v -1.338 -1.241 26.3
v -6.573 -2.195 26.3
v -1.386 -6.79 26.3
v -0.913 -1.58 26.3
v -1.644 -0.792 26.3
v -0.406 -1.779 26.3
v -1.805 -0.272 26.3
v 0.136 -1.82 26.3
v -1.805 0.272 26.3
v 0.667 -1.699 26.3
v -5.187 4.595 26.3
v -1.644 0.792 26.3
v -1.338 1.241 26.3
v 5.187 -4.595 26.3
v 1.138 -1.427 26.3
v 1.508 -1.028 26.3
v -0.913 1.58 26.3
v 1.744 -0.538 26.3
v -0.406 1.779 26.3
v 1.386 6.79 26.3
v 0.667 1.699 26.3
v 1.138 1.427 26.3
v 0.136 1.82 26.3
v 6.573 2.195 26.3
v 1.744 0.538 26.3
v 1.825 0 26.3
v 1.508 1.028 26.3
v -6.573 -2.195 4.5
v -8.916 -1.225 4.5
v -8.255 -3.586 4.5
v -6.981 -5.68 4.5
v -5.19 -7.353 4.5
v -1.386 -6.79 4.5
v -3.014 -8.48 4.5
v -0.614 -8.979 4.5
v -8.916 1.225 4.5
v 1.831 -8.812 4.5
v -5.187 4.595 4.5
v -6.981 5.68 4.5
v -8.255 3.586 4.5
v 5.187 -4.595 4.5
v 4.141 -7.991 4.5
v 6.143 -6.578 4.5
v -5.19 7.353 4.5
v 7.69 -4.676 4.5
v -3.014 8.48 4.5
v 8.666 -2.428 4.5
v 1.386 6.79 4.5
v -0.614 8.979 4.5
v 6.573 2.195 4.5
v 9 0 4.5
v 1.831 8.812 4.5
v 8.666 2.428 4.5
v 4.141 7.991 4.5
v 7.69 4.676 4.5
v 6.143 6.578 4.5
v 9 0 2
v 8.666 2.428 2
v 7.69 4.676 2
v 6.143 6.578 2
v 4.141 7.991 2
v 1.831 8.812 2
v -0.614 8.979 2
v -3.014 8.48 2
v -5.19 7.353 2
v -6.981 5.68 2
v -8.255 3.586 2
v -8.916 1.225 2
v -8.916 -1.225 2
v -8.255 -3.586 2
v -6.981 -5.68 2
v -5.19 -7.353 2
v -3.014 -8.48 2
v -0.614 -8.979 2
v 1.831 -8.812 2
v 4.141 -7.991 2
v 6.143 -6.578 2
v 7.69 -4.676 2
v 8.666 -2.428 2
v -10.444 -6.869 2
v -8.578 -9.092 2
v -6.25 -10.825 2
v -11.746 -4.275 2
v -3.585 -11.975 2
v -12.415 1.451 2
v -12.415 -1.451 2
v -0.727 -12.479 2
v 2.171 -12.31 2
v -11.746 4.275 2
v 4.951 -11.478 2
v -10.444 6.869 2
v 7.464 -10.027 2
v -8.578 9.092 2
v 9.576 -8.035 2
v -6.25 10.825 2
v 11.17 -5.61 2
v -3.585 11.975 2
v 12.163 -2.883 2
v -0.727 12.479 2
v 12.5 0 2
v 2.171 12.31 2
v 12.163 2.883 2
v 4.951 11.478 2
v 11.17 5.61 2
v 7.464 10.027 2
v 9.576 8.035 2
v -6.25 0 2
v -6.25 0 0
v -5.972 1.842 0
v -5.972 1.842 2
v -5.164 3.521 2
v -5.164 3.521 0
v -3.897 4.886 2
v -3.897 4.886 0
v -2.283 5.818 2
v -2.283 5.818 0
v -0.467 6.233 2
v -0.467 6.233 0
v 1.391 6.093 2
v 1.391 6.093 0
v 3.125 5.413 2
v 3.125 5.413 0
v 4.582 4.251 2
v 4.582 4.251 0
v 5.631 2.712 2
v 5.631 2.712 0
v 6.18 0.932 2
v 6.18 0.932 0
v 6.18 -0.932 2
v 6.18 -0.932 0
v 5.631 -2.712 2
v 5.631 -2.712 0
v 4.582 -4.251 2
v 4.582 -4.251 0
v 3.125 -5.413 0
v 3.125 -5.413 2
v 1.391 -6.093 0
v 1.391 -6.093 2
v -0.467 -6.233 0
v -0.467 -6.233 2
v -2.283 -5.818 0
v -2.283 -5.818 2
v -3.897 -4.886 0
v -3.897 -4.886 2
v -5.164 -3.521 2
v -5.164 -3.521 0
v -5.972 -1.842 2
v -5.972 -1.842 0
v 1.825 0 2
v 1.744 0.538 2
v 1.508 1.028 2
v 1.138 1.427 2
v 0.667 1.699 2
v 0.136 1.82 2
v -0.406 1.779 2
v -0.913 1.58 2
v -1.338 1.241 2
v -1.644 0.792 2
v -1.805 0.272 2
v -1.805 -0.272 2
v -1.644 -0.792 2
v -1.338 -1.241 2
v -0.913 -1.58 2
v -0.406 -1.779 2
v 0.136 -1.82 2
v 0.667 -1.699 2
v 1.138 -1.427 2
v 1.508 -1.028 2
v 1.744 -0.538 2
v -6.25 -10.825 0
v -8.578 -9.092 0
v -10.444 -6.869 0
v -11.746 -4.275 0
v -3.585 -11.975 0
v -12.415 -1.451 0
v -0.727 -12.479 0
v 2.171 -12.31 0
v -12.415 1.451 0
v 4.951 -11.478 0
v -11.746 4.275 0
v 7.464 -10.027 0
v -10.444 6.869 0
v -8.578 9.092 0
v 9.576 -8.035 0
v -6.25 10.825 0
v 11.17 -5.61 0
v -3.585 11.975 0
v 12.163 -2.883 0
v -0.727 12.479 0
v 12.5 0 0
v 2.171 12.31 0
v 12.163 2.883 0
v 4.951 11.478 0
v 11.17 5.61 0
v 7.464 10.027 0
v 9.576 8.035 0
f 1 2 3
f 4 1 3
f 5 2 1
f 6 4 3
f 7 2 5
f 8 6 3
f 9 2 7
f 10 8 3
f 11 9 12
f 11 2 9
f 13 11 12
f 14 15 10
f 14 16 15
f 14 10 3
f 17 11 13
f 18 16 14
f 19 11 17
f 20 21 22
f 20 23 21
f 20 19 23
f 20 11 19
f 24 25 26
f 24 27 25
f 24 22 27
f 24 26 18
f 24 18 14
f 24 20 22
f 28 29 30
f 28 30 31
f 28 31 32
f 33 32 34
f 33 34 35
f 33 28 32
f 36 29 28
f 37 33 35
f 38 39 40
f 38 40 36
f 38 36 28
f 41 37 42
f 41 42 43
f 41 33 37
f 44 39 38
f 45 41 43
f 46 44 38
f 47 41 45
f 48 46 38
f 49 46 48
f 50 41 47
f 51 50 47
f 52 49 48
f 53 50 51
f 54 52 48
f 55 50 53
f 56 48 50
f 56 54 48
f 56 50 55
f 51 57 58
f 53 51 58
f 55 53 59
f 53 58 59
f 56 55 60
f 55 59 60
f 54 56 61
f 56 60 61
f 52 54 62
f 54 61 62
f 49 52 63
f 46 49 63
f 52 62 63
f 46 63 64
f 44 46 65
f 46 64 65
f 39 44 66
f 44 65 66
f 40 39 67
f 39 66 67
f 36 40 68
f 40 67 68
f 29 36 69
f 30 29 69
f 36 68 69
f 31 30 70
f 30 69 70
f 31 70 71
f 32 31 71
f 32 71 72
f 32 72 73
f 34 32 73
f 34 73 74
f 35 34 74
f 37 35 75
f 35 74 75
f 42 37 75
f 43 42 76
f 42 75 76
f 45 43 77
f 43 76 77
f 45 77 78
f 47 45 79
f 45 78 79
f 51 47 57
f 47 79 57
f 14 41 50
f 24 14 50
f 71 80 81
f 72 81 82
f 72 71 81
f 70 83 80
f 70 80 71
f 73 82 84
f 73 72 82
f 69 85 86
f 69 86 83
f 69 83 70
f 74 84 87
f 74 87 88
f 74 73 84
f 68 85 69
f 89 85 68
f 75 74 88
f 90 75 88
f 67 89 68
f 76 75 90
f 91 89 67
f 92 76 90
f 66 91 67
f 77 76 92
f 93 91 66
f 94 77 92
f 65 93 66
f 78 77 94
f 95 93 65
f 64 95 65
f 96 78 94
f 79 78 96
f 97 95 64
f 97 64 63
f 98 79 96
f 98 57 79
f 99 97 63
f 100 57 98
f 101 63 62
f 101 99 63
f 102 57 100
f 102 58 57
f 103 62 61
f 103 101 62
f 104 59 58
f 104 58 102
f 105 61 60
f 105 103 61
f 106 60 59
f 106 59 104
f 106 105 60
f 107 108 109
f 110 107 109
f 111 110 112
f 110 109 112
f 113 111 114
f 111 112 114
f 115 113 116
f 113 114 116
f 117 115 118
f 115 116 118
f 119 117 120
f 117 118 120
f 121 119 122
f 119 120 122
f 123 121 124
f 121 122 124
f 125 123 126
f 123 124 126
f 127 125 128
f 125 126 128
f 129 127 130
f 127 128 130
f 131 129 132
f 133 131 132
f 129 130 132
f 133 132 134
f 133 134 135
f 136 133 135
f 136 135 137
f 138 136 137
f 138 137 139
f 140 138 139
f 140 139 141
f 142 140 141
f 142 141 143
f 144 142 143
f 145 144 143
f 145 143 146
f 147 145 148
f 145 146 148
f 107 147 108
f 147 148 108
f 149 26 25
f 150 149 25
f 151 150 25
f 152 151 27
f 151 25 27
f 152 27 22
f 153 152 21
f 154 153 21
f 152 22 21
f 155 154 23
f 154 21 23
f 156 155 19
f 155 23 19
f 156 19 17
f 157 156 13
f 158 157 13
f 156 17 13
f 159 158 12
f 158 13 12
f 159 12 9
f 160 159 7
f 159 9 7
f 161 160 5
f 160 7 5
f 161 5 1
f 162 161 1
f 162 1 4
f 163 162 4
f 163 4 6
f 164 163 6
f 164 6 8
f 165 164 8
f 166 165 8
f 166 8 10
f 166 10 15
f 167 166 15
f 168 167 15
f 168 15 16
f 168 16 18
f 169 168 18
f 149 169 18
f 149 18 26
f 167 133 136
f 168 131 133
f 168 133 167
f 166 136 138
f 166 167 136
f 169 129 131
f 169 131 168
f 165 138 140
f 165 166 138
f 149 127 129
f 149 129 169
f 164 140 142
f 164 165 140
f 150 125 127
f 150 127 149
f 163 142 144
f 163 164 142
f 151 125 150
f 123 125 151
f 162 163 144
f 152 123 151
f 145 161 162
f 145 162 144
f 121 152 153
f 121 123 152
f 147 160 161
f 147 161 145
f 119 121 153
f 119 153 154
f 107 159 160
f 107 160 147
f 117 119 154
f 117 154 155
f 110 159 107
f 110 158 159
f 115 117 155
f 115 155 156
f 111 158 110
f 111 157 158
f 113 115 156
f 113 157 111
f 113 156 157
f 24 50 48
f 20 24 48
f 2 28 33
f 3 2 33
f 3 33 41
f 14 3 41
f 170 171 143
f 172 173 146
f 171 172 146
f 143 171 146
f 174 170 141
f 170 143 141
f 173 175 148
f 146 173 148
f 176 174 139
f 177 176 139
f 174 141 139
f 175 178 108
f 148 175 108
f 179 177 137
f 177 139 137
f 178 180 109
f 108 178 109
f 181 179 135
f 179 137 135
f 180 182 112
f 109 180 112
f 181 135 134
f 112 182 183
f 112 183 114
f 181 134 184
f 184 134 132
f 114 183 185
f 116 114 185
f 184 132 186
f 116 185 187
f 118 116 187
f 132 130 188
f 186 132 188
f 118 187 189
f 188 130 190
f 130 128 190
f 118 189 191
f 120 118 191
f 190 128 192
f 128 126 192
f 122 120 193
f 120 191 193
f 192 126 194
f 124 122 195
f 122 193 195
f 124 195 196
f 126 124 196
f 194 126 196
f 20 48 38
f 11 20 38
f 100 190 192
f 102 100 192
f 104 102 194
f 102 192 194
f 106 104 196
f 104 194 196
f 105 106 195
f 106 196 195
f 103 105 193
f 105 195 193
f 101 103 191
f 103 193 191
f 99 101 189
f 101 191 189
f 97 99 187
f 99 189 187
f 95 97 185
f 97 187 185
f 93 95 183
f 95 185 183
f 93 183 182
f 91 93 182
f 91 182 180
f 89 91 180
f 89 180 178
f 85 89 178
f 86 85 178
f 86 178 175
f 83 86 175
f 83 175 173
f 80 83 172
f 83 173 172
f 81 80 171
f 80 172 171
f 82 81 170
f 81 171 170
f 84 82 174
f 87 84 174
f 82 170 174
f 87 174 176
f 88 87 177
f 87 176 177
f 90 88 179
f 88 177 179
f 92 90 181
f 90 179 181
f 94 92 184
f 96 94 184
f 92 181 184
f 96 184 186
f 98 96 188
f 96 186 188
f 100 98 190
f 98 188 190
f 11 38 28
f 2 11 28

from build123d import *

# Parameters (mm, degrees)
SKETCH_1_R          = 12.5
EXTRUDE_1_DEPTH     = 2
SKETCH_2_R          = 9
EXTRUDE_2_DEPTH     = 2.5
EXTRUDE_3_DEPTH     = 21.8
SKETCH_4_R          = 1.825
CUT_EXTRUDE_1_DEPTH = 32.688957067
SKETCH_5_R          = 6.25
CUT_EXTRUDE_2_DEPTH = 2


with BuildPart() as part:
    # 草图1 → 凸台-拉伸1 (new body)
    with BuildSketch(Plane.XY):
        Circle(SKETCH_1_R)
    extrude(amount=EXTRUDE_1_DEPTH)

    # 草图2 → 凸台-拉伸2 (add)
    with BuildSketch(Plane.XY.offset(2)):
        Circle(SKETCH_2_R)
    extrude(amount=EXTRUDE_2_DEPTH)

    # 草图3 → 凸台-拉伸3 (add)
    with BuildSketch(Plane.XY.offset(4.5)):
        Polygon((5.187426457, -4.595161232), (6.57323959, 2.194862476), (1.385813133, 6.790023708), (-5.187426457, 4.595161232), (-6.57323959, -2.194862476), (-1.385813133, -6.790023708), align=None)
    extrude(amount=EXTRUDE_3_DEPTH)

    # 草图4 → 切除-拉伸1 (cut, through all)
    with BuildSketch(Plane.XY.offset(26.3)):
        Circle(SKETCH_4_R)
    extrude(amount=-CUT_EXTRUDE_1_DEPTH, mode=Mode.SUBTRACT)

    # 草图5 → 切除-拉伸2 (cut)
    with BuildSketch(Plane(origin=(0, 0, 0), x_dir=(-1, 0, 0), z_dir=(0, 0, -1))):
        Circle(SKETCH_5_R)
    extrude(amount=-CUT_EXTRUDE_2_DEPTH, mode=Mode.SUBTRACT)


solid = part.part
